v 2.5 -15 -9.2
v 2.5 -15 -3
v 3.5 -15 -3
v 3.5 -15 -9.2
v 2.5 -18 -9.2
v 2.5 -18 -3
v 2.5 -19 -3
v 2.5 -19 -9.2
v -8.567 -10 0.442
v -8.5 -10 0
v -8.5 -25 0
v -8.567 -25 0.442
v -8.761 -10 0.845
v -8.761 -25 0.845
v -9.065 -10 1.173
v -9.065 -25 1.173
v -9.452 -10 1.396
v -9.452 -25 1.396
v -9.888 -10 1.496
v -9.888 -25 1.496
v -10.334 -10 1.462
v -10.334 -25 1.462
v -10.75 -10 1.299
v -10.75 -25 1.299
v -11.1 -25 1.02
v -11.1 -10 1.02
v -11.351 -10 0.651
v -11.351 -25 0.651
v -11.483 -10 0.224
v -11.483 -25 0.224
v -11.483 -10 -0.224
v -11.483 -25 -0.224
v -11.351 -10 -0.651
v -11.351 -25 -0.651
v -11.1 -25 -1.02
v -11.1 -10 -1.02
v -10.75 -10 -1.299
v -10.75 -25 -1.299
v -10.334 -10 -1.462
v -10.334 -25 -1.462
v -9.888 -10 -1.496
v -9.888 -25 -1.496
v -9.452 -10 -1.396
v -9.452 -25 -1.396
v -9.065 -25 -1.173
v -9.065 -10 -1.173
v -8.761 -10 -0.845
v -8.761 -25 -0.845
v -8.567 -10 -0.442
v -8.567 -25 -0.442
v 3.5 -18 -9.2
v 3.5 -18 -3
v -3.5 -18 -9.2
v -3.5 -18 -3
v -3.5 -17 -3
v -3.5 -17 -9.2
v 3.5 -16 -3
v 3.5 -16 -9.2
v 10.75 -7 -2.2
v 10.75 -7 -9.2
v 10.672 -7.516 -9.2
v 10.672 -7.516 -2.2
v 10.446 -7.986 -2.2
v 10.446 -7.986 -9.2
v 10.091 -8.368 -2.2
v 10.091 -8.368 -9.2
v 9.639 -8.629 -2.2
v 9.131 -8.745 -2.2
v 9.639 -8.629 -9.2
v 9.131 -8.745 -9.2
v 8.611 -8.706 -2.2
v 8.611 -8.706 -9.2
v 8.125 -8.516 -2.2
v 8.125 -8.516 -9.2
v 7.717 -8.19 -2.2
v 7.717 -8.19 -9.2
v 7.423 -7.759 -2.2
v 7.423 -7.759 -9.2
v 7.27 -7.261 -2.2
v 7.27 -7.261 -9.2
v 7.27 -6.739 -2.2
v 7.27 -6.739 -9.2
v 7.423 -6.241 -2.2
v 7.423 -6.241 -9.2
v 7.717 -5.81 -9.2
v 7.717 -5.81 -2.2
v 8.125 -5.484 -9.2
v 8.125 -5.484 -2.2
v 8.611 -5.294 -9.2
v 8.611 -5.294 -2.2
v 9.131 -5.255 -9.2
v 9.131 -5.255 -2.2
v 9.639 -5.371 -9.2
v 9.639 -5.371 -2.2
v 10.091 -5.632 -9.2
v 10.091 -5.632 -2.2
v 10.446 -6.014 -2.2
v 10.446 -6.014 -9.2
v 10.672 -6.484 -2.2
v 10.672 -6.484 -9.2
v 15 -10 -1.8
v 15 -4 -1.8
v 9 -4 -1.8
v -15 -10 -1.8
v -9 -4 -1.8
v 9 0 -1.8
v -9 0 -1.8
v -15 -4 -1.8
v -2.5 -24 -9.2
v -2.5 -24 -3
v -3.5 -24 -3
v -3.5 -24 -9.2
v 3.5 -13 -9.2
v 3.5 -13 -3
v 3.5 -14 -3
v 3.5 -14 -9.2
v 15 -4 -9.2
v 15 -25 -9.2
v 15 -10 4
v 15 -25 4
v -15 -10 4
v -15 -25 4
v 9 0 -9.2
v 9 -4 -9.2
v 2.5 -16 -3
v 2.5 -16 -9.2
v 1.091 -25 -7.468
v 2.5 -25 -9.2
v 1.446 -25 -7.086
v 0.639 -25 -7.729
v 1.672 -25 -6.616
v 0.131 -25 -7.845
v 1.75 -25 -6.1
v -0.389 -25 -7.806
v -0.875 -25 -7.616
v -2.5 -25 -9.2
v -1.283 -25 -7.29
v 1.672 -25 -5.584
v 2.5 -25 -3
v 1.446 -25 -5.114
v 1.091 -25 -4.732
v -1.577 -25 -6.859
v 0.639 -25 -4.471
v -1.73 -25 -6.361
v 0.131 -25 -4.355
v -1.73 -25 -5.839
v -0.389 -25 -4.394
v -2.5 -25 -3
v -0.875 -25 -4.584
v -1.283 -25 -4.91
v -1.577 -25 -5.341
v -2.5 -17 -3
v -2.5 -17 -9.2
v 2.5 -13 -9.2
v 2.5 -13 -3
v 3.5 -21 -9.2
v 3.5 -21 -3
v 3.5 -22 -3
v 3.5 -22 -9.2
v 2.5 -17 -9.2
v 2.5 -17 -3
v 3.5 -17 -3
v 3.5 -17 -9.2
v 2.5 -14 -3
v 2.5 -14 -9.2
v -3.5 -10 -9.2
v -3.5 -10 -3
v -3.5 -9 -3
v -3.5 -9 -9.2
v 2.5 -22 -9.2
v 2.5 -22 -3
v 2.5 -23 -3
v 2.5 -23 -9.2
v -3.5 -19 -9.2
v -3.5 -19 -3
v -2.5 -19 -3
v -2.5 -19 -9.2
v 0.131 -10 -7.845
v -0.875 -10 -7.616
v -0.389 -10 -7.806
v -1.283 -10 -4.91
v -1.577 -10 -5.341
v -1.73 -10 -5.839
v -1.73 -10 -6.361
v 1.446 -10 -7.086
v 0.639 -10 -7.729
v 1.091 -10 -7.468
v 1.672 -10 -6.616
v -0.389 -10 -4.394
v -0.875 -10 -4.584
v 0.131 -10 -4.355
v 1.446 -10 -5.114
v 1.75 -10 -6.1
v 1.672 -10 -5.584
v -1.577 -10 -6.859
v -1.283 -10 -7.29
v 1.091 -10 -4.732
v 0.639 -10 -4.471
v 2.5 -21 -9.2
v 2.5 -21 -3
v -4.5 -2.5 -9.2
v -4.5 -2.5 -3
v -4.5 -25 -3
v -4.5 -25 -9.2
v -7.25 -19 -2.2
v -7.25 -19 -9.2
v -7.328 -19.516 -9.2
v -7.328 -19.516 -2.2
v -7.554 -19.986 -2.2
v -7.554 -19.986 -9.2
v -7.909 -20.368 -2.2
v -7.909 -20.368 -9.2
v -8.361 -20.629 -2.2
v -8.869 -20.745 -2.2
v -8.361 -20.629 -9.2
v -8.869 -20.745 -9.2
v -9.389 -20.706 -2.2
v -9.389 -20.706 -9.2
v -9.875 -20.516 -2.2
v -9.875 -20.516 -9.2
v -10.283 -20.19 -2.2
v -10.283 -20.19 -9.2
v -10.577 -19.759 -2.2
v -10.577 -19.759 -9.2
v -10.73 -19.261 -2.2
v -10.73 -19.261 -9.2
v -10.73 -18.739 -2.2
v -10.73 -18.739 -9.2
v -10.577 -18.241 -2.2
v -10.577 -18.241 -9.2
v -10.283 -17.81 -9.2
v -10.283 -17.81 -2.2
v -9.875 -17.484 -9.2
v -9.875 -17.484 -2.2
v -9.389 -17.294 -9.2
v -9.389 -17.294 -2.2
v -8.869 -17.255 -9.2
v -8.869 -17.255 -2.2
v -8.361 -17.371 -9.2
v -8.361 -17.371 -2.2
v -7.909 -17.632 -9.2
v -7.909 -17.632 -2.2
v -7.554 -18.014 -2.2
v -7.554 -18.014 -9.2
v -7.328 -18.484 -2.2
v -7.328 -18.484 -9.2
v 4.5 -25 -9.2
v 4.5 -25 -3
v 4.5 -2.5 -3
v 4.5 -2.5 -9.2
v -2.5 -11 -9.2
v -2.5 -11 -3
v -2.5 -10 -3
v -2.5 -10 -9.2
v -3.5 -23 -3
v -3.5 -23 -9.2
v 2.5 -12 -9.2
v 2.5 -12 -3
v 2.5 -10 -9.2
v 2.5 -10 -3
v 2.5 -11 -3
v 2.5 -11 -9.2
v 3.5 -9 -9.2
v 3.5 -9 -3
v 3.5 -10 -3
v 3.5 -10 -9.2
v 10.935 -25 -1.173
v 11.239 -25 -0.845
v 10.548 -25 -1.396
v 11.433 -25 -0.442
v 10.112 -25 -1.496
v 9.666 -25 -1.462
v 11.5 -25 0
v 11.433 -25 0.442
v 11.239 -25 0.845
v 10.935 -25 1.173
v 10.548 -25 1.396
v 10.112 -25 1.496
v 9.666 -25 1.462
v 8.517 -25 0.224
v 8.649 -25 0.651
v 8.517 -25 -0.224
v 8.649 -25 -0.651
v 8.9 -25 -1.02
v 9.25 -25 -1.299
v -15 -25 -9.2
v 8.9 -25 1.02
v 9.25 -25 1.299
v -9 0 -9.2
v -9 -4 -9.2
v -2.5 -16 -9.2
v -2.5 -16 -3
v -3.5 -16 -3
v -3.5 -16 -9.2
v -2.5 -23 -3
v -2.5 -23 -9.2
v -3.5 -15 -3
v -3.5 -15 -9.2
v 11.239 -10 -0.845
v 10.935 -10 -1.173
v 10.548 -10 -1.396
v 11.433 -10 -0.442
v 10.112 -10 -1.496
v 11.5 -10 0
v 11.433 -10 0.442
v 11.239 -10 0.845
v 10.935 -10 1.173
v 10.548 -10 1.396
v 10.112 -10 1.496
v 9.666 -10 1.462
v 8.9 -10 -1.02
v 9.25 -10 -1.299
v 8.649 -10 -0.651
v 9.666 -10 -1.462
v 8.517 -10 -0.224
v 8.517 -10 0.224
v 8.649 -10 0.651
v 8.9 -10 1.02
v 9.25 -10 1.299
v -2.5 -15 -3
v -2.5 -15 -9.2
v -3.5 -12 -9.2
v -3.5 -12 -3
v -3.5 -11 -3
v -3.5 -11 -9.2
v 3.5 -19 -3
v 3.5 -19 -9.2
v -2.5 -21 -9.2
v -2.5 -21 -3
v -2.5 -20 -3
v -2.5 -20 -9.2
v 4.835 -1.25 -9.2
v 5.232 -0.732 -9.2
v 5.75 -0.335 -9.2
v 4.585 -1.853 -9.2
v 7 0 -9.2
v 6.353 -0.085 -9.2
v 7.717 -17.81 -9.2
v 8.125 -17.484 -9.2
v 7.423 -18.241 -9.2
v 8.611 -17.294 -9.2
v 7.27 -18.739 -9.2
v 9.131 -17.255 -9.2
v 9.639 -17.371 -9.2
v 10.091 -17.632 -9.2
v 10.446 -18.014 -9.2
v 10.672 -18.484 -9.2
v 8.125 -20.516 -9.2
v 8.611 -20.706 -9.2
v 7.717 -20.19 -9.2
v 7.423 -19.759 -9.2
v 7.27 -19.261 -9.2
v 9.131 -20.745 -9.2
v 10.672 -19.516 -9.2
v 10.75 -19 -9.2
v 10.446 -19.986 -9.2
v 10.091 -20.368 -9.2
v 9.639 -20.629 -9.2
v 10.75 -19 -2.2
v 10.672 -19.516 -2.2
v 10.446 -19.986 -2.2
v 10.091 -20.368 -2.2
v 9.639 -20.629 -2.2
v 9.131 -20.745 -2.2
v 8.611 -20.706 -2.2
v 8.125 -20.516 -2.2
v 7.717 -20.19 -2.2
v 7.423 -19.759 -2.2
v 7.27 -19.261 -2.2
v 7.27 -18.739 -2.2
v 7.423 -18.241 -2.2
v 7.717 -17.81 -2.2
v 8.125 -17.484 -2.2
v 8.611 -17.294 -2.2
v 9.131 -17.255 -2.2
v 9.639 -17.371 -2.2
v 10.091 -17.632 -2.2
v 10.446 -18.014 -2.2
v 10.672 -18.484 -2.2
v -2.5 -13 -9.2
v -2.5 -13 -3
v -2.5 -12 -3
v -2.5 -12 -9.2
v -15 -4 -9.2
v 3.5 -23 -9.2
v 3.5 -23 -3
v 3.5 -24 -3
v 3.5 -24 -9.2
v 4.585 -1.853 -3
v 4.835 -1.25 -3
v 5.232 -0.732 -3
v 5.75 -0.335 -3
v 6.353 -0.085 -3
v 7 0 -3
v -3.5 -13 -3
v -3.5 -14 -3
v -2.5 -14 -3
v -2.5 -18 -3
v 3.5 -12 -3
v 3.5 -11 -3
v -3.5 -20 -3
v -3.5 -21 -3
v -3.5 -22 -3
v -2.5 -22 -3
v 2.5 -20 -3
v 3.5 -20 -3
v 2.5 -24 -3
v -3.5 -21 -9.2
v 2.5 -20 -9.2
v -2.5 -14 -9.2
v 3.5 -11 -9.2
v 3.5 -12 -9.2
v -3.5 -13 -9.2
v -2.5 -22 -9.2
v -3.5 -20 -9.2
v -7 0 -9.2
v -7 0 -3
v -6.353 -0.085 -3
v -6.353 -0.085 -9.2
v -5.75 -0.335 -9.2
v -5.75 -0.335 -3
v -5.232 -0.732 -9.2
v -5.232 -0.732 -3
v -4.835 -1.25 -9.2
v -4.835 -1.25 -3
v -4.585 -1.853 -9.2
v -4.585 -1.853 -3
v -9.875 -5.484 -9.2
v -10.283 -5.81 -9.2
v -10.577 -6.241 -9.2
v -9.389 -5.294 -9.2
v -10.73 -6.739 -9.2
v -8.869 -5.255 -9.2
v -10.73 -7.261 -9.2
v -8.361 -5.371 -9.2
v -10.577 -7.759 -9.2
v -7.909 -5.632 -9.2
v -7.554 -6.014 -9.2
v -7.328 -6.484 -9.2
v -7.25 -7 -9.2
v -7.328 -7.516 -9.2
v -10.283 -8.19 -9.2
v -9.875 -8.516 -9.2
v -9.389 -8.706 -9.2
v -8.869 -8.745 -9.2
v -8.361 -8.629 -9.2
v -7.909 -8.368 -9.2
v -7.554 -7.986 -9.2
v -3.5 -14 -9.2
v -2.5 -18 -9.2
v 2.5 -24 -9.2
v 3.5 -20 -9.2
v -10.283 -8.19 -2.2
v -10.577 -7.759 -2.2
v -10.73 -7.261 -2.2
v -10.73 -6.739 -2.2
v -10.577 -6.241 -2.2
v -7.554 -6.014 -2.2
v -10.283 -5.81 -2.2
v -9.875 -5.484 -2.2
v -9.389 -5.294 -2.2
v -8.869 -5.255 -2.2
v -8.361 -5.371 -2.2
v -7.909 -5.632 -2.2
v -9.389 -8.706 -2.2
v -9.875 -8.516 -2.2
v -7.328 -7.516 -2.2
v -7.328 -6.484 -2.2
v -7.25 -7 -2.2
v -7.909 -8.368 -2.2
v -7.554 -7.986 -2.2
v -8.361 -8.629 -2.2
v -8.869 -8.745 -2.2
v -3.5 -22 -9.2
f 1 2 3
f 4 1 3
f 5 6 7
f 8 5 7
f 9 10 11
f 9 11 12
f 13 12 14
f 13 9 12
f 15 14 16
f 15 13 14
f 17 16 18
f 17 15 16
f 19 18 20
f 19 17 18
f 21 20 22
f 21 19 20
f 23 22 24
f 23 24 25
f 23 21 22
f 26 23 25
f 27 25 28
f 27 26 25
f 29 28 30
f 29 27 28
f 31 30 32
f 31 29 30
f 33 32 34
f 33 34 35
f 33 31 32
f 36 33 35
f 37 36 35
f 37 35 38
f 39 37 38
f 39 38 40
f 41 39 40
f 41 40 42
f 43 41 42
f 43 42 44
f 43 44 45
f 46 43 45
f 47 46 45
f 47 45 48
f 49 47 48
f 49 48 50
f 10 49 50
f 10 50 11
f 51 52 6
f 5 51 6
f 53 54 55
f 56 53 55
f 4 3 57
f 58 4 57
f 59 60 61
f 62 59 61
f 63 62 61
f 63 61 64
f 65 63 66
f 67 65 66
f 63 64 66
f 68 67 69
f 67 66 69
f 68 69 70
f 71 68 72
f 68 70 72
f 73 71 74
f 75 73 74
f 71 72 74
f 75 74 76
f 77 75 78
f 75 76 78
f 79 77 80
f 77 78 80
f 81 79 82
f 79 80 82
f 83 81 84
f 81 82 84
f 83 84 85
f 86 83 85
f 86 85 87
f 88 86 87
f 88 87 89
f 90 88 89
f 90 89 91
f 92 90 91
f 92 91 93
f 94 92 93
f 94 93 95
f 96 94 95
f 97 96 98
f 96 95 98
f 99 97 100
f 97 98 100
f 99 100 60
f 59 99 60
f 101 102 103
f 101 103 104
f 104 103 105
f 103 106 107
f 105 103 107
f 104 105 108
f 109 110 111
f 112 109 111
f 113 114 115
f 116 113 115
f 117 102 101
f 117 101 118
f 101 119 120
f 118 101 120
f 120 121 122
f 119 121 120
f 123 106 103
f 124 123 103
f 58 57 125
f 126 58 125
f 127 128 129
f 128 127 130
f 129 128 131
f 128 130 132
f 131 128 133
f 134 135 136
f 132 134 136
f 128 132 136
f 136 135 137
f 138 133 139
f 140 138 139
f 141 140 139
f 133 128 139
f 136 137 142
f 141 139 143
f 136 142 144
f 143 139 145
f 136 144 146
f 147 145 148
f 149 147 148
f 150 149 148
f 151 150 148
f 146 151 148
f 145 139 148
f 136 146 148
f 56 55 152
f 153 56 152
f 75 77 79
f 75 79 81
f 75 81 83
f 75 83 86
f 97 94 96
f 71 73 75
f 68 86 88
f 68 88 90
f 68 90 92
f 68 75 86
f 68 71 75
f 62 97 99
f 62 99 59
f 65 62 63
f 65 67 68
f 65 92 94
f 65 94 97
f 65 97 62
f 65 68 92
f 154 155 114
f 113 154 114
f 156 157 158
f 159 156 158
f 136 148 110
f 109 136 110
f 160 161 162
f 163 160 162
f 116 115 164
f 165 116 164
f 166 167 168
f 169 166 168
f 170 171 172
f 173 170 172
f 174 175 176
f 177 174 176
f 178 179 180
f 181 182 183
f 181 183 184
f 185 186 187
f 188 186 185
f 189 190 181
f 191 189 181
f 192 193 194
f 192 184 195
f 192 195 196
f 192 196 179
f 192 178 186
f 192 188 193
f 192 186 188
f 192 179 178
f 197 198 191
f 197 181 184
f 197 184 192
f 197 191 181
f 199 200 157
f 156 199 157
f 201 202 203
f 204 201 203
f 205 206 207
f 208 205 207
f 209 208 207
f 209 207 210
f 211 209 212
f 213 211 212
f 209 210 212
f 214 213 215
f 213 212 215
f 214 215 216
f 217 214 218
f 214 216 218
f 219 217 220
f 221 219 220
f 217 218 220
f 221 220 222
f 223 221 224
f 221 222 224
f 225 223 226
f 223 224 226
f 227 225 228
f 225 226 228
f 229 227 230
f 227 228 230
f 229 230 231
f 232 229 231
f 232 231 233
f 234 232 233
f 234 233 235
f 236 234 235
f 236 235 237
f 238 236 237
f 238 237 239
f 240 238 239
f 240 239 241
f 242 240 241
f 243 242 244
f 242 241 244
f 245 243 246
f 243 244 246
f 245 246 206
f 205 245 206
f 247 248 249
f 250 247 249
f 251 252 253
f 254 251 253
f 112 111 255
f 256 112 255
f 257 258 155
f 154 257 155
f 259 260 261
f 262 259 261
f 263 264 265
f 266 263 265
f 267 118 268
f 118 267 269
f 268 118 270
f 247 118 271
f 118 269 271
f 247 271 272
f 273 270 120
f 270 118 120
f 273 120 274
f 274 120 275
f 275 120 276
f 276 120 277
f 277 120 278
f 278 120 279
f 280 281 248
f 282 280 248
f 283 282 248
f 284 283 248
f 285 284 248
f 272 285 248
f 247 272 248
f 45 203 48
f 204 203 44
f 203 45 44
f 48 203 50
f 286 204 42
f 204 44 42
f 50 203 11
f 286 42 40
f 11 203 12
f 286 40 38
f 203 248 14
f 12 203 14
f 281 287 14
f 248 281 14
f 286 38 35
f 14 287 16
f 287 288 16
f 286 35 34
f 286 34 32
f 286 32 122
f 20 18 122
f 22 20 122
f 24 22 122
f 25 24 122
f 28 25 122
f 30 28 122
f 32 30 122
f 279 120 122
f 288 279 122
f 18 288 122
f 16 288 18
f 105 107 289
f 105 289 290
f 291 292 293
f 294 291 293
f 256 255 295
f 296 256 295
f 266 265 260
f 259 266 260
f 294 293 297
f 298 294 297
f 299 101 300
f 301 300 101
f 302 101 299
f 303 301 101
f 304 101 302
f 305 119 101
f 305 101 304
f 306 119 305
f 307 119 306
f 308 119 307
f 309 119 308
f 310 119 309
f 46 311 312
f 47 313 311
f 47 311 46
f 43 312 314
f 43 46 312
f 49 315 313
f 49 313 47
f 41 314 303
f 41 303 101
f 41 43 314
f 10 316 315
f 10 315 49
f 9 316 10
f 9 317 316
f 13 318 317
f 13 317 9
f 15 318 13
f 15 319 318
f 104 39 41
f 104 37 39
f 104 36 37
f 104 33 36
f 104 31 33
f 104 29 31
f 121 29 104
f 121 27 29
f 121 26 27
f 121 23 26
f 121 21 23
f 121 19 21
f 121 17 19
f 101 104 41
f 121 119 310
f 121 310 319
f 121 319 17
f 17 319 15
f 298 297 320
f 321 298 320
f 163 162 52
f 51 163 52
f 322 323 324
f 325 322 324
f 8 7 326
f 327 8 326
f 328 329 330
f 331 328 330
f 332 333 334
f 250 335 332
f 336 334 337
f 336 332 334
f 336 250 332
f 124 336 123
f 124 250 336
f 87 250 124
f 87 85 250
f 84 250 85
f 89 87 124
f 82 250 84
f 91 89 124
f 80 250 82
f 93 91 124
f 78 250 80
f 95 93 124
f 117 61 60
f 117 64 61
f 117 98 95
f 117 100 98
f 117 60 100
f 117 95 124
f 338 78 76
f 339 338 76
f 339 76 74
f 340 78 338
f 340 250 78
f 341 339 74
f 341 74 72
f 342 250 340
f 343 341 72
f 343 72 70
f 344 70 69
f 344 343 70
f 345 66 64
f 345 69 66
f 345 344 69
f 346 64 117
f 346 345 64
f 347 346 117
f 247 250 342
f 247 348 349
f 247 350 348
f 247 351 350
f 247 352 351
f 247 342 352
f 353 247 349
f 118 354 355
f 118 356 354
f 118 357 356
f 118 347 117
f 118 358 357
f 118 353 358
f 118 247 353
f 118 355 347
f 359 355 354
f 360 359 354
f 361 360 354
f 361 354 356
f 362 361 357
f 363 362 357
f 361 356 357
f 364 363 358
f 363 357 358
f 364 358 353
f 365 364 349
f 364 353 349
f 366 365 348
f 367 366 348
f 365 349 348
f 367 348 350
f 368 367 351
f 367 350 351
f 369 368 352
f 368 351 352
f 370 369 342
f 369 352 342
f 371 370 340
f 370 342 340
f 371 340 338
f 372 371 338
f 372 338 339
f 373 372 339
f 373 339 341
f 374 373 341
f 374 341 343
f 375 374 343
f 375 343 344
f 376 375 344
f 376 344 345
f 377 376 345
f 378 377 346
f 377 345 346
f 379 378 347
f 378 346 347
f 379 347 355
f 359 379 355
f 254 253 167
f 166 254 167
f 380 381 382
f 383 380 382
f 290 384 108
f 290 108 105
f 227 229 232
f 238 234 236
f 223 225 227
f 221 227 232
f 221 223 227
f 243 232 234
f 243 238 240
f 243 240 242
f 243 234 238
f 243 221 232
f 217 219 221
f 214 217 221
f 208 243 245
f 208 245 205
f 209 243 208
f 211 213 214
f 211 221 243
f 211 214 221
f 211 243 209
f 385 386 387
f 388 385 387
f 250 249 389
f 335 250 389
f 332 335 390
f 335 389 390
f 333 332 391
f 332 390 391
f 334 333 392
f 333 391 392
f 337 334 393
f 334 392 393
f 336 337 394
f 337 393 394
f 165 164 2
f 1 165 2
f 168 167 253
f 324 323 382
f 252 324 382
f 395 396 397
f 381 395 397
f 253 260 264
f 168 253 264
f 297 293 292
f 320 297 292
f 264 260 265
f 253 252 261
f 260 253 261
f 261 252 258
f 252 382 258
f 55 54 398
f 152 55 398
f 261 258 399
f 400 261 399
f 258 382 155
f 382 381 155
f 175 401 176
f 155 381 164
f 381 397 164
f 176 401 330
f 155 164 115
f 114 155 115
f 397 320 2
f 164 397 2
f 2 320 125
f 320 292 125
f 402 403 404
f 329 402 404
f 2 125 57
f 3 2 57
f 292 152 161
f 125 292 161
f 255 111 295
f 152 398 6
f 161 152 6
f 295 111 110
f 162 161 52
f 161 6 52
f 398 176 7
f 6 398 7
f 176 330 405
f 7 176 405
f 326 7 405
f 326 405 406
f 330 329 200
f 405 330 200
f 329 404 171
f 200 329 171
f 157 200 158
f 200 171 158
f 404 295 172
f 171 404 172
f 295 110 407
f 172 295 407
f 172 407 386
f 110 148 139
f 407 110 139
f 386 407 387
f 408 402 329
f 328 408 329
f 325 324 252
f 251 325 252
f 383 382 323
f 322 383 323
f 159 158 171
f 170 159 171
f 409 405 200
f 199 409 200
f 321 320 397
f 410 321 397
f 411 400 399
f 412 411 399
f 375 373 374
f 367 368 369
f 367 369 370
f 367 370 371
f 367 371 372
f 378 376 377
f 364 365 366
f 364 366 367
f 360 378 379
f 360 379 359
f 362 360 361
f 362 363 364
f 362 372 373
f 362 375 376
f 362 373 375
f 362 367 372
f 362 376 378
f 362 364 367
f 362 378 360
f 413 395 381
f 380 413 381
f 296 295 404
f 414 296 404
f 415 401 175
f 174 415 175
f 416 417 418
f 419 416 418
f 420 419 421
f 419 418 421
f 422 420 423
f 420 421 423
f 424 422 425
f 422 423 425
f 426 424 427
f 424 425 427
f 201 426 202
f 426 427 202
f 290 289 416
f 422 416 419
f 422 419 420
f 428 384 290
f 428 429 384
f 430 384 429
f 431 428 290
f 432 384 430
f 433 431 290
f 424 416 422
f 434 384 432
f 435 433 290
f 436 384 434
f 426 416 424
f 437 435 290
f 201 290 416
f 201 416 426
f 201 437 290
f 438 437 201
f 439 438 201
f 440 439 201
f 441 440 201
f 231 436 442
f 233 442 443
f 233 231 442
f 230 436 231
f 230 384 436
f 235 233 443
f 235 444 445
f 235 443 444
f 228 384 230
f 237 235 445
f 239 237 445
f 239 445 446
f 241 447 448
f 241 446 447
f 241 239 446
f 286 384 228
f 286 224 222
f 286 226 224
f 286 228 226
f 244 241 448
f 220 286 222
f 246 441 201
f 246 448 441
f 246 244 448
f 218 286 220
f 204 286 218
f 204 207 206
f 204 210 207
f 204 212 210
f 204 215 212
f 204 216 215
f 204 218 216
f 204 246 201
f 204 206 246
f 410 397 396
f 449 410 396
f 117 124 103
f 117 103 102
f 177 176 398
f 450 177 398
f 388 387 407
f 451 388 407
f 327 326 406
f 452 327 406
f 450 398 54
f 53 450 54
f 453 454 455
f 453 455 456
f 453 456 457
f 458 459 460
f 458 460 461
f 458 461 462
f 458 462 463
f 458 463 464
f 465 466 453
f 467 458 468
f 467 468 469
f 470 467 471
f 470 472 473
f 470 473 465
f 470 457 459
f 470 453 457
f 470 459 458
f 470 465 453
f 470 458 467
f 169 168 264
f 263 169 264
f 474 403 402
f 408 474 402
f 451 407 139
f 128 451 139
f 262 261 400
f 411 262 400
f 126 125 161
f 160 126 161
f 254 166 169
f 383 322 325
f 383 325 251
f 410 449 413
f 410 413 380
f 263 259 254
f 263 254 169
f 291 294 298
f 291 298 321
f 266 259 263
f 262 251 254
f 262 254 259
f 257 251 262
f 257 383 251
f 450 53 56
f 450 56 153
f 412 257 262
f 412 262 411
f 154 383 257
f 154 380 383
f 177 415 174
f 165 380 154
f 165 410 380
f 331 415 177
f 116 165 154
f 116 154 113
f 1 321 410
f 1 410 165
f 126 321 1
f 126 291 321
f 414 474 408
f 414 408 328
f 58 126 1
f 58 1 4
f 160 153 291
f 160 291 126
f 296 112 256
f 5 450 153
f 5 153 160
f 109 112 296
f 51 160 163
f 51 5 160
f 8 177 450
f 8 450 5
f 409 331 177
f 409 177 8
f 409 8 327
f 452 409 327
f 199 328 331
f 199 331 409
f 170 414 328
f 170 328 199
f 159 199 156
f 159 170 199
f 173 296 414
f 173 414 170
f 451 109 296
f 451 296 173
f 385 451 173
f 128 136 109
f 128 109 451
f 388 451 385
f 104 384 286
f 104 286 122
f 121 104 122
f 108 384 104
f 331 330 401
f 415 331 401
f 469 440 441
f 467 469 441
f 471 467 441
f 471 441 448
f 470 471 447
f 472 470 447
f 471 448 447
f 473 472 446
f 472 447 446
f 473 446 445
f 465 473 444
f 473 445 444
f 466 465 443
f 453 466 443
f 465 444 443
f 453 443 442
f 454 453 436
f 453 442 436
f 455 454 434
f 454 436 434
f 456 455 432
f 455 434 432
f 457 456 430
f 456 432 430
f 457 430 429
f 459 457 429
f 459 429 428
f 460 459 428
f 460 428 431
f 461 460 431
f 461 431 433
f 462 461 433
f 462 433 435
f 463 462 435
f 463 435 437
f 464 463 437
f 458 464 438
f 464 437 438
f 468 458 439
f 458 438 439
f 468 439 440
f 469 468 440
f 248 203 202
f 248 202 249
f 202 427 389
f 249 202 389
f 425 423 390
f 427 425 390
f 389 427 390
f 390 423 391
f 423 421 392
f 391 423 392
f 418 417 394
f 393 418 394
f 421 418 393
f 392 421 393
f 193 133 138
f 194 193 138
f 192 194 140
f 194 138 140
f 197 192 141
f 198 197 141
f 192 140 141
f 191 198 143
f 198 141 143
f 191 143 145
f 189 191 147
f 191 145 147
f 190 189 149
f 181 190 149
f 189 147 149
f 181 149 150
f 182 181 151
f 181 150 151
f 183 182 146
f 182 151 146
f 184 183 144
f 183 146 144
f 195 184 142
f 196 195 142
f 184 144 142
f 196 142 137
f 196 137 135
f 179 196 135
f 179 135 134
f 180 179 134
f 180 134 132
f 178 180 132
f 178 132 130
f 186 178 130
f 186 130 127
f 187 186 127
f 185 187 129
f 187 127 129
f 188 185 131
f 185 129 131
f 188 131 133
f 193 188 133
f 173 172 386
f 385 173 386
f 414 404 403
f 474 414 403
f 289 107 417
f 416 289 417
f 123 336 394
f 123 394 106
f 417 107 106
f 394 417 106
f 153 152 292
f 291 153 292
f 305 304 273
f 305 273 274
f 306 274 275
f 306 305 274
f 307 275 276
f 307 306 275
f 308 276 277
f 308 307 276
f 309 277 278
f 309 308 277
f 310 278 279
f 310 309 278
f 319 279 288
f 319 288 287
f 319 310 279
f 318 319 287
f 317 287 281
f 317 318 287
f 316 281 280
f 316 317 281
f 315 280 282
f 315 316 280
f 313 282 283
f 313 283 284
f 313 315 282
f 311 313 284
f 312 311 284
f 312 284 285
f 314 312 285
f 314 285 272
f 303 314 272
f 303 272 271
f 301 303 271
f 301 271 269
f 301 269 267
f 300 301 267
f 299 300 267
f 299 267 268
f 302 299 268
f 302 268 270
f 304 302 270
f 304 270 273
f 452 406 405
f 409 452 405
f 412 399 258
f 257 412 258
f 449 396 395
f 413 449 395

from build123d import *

# Parameters (mm, degrees)
F0_W      = 30
F0_H      = 7
F0_R      = 1.5
F1_DEPTH  = 25
F3_DEPTH  = 6.2
F4_DEPTH  = 6.2
F5_R      = 1.75
F6_DEPTH  = 15
F7_R      = 1.75
F8_DEPTH  = 7
F9_W      = 30
F9_H      = 5.8
F10_DEPTH = 10
F11_W     = 6
F11_H     = 4
F12_DEPTH = 13.201


with BuildPart() as f1:
    # F0 (on Front) → F1 (new body)
    with BuildSketch(Plane.XZ):
        with Locations((0, 0.5)):
            Rectangle(F0_W, F0_H)
        with Locations((-10, 0)):
            Circle(F0_R, mode=Mode.SUBTRACT)
        with Locations((10, 0)):
            Circle(F0_R, mode=Mode.SUBTRACT)
    extrude(amount=F1_DEPTH)

    # F2 (on face) → F4 (join)
    with BuildSketch(Plane(origin=(0, 0, -3), x_dir=(1, 0, 0), z_dir=(0, 0, -1))):
        with BuildLine():
            Line((4.5, 25), (4.5, 2.5))
            ThreePointArc((4.5, 2.5), (5.232233, 0.732233), (7, 0))
            Line((7, 0), (15, 0))
            Line((15, 0), (15, 25))
            Line((15, 25), (4.5, 25))
        make_face()
        with BuildLine():
            Line((-4.5, 25), (-15, 25))
            Line((-15, 25), (-15, 0))
            Line((-15, 0), (-7, 0))
            ThreePointArc((-7, 0), (-5.232233, 0.732233), (-4.5, 2.5))
            Line((-4.5, 2.5), (-4.5, 25))
        make_face()
    extrude(amount=F4_DEPTH)

    # F7 (on face) → F8 (cut)
    with BuildSketch(Plane(origin=(0, 0, -9.2), x_dir=(1, 0, 0), z_dir=(0, 0, -1))):
        with Locations((9, 7)):
            Circle(F7_R)
        with Locations((9, 19)):
            Circle(F7_R)
        with Locations((-9, 7)):
            Circle(F7_R)
        with Locations((-9, 19)):
            Circle(F7_R)
    extrude(amount=-F8_DEPTH, mode=Mode.SUBTRACT)

    # F9 (on face) → F10 (cut)
    with BuildSketch(Plane(origin=(0, 0, 0), x_dir=(-1, 0, 0), z_dir=(0, 1, 0))):
        with Locations((0, 1.1)):
            Rectangle(F9_W, F9_H)
    extrude(amount=-F10_DEPTH, mode=Mode.SUBTRACT)

    # F11 (on face) → F12 (cut, through all)
    with BuildSketch(Plane(origin=(0, 0, -9.2), x_dir=(1, 0, 0), z_dir=(0, 0, -1))):
        with Locations((-12, 2)):
            Rectangle(F11_W, F11_H)
        with Locations((12, 2)):
            Rectangle(F11_W, F11_H)
    extrude(amount=-F12_DEPTH, mode=Mode.SUBTRACT)


with BuildPart() as f3:
    # F2 (on face) → F3 (new body)
    with BuildSketch(Plane(origin=(0, 0, -3), x_dir=(1, 0, 0), z_dir=(0, 0, -1))):
        Polygon((2.5, 25), (-2.5, 25), (-2.5, 24), (-3.5, 24), (-3.5, 23), (-2.5, 23), (-2.5, 22), (-3.5, 22), (-3.5, 21), (-2.5, 21), (-2.5, 20), (-3.5, 20), (-3.5, 19), (-2.5, 19), (-2.5, 18), (-3.5, 18), (-3.5, 17), (-2.5, 17), (-2.5, 16), (-3.5, 16), (-3.5, 15), (-2.5, 15), (-2.5, 14), (-3.5, 14), (-3.5, 13), (-2.5, 13), (-2.5, 12), (-3.5, 12), (-3.5, 11), (-2.5, 11), (-2.5, 10), (-3.5, 10), (-3.5, 9), (-2.5, 9), (2.5, 9), (3.5, 9), (3.5, 10), (2.5, 10), (2.5, 11), (3.5, 11), (3.5, 12), (2.5, 12), (2.5, 13), (3.5, 13), (3.5, 14), (2.5, 14), (2.5, 15), (3.5, 15), (3.5, 16), (2.5, 16), (2.5, 17), (3.5, 17), (3.5, 18), (2.5, 18), (2.5, 19), (3.5, 19), (3.5, 20), (2.5, 20), (2.5, 21), (3.5, 21), (3.5, 22), (2.5, 22), (2.5, 23), (3.5, 23), (3.5, 24), (2.5, 24), align=None)
    extrude(amount=F3_DEPTH)

    # F5 (on face) → F6 (cut)
    with BuildSketch(Plane.XZ.offset(25)):
        with Locations((0, -6.1)):
            Circle(F5_R)
    extrude(amount=-F6_DEPTH, mode=Mode.SUBTRACT)


solid = Compound([f1.part, f3.part])
